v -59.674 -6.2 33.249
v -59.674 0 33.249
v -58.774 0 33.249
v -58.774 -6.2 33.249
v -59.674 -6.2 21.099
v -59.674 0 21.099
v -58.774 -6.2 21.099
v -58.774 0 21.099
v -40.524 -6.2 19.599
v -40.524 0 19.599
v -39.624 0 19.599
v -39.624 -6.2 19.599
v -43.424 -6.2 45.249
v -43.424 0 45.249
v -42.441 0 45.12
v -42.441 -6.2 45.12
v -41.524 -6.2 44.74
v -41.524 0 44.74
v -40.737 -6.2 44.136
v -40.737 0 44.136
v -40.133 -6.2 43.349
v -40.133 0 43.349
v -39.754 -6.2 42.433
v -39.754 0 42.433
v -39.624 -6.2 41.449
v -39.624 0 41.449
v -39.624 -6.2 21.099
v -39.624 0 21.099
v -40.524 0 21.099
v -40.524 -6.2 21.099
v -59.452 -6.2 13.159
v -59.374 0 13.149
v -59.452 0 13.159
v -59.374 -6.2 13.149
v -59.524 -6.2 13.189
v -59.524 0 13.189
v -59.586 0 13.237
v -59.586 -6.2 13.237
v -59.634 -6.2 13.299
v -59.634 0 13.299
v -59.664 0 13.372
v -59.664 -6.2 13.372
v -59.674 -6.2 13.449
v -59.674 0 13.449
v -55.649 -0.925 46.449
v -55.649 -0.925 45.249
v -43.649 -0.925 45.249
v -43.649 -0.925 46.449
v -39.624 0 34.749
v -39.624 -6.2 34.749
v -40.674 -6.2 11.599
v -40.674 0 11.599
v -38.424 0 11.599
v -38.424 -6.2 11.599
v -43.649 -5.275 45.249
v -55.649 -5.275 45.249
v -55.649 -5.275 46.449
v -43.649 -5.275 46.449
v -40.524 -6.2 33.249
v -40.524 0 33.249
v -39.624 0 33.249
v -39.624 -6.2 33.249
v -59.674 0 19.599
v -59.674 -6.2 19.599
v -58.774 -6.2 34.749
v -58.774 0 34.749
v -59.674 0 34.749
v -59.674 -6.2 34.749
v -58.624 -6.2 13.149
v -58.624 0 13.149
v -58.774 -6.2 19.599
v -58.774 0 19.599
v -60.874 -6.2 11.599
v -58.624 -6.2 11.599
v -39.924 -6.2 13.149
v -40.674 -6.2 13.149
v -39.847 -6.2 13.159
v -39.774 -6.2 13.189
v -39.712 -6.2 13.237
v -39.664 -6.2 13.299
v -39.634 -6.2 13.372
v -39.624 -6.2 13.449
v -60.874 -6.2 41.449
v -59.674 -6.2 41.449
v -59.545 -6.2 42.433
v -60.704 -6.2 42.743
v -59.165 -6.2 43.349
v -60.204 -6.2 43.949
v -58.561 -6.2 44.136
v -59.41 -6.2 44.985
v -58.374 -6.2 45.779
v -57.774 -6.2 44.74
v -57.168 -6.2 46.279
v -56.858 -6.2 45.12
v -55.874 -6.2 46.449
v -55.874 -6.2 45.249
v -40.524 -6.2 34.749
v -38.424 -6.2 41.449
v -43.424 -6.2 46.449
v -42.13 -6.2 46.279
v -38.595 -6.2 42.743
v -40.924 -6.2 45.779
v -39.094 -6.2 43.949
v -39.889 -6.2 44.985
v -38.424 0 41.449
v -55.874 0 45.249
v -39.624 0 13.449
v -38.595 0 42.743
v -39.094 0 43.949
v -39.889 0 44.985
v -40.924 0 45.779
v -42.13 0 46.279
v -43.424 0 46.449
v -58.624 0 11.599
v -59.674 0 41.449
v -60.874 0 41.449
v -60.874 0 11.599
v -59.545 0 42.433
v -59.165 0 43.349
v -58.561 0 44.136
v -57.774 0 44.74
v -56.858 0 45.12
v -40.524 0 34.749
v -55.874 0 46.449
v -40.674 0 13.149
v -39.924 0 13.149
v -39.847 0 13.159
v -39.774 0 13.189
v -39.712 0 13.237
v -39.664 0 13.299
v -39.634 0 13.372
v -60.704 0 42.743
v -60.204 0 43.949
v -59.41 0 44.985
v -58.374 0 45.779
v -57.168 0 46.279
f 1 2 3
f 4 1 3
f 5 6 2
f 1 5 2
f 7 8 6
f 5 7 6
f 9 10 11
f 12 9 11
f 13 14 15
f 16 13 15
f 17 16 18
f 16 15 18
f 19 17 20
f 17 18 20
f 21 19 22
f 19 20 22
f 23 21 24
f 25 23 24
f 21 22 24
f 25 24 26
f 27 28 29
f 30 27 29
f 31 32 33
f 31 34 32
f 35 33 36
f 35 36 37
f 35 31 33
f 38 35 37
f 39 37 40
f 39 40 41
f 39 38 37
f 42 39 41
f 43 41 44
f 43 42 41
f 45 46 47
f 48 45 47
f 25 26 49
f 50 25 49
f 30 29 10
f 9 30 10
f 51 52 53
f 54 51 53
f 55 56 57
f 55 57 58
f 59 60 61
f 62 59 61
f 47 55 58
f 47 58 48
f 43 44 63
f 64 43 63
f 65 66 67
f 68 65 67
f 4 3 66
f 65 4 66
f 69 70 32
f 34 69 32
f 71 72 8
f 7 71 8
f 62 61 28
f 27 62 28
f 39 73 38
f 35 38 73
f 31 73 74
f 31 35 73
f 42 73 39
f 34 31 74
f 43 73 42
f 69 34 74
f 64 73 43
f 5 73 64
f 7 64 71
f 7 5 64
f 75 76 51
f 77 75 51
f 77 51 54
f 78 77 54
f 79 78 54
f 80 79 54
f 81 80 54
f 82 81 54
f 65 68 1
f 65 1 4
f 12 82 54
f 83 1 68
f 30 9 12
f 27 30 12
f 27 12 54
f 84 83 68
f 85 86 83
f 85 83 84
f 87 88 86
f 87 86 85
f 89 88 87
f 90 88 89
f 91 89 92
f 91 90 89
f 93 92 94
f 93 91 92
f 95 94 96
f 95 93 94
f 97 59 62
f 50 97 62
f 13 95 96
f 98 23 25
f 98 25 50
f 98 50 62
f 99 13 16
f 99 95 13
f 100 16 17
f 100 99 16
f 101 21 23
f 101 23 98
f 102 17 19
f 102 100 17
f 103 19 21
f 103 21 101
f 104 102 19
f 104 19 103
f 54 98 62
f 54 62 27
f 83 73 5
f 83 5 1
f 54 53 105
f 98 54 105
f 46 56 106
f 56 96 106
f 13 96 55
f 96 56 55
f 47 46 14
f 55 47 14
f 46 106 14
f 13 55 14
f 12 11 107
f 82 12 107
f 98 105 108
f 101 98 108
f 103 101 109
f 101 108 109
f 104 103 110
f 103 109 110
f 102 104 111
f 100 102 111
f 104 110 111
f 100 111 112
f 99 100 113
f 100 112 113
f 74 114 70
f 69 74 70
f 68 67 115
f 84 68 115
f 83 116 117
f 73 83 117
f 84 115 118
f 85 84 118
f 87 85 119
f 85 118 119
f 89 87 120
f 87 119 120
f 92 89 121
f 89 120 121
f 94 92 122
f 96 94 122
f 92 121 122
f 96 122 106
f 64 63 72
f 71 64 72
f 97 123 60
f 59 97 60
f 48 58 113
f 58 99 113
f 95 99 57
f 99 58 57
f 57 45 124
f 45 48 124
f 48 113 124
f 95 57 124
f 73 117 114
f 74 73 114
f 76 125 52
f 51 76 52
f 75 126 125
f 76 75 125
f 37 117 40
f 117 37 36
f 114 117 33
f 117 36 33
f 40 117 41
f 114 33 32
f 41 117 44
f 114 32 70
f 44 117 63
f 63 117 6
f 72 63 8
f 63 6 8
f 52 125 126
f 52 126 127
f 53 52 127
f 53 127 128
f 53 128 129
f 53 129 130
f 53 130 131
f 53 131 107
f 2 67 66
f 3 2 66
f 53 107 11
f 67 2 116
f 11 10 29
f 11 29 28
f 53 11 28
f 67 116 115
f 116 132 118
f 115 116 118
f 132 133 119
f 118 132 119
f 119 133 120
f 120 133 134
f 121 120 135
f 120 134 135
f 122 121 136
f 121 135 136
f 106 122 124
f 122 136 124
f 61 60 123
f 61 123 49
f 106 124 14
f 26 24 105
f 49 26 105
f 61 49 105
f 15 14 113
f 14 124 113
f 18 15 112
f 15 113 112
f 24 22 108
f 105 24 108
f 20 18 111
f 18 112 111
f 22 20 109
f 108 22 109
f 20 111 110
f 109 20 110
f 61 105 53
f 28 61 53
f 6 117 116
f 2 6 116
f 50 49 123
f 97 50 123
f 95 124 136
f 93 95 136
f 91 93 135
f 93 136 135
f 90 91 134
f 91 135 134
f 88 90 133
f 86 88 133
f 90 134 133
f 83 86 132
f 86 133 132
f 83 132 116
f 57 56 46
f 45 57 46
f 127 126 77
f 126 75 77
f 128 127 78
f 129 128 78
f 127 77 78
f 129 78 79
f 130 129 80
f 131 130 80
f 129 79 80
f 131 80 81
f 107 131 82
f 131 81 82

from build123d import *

# Parameters (mm, degrees)
F1_DEPTH     = 9.79181
F2_T         = -2.5
F3_R         = 5
F4_T1_DEPTH  = 80
F4_T3_DEPTH  = 40
F4_T6_ANGLE  = 90
F4_T8_ANGLE  = 90
F4_T10_ANGLE = 90
F4_T12_ANGLE = 90
F5_R         = 7
F6_R         = 4.5
F7_DEPTH     = 130
F8_T         = -2.5
F12_DEPTH    = 6.2
F13_R        = 0.3
F14_R        = 0.3
F15_W        = 12
F15_H        = 4.35
F16_DEPTH    = 67.90149


# Not quite as in the source:
# - a fillet or chamfer that OpenCascade refuses, or shapes differently, is made with other operations: its cross-section is extruded or revolved along the edge and cut away or added


with BuildPart() as f1:
    # F0 (on Front) → F1 (new body)
    with BuildSketch(Plane.XZ):
        with BuildLine():
            Line((33.4467580169, 25.7645070341), (-46.5532419831, 25.7645070341))
            ThreePointArc((-46.5532419831, 25.7645070341), (-50.088775889, 24.30004094), (-51.5532419831, 20.7645070341))
            Line((-51.5532419831, 20.7645070341), (-51.5532419831, -19.2354929659))
            ThreePointArc((-51.5532419831, -19.2354929659), (-50.088775889, -22.7710268718), (-46.5532419831, -24.2354929659))
            Line((-46.5532419831, -24.2354929659), (33.4467580169, -24.2354929659))
            ThreePointArc((33.4467580169, -24.2354929659), (36.9822919229, -22.7710268718), (38.4467580169, -19.2354929659))
            Line((38.4467580169, -19.2354929659), (38.4467580169, 20.7645070341))
            ThreePointArc((38.4467580169, 20.7645070341), (36.9822919229, 24.30004094), (33.4467580169, 25.7645070341))
        make_face()
    extrude(amount=F1_DEPTH)

    # F2
    f2_openings = [f1.faces().sort_by_distance(p)[0] for p in [
        (-6.553242, -9.79181, 0.764507),
    ]]
    offset(amount=F2_T, openings=f2_openings)

    # F3
    f3_edges = [f1.edges().sort_by_distance(p)[0] for p in [
        (-6.553242, -2.5, 23.264507),
    ]]
    fillet(f3_edges, radius=F3_R)

    # F4: fillet of radius 5 on 1 edges, made by hand

    # F4_s2 → F4_t1 (cut)
    with BuildSketch(Plane.YZ.offset(-46.5532419831)):
        with BuildLine():
            ThreePointArc((-6.145905, 23.0776584685), (-8.7774388713, 24.8717434082), (-9.79181, 27.890809903))
            Line((-9.79181, 27.890809903), (-10.29181, 27.890809903))
            Line((-10.29181, 27.890809903), (-10.29181, 23.2645070341))
            Line((-10.29181, 23.2645070341), (-9.79181, 22.7645070341))
            ThreePointArc((-9.79181, 22.7645070341), (-7.5, 22.7645070341), (-6.2813145, 22.5963433251))
            Line((-6.2813145, 22.5963433251), (-6.145905, 23.0776584685))
        make_face()
        with BuildLine():
            ThreePointArc((-9.79181, -26.3617958348), (-8.7774388713, -23.34272934), (-6.145905, -21.5486444004))
            Line((-6.145905, -21.5486444004), (-6.2813145, -21.0673292569))
            ThreePointArc((-6.2813145, -21.0673292569), (-7.5, -21.2354929659), (-9.79181, -21.2354929659))
            Line((-9.79181, -21.2354929659), (-10.29181, -21.7354929659))
            Line((-10.29181, -21.7354929659), (-10.29181, -26.3617958348))
            Line((-10.29181, -26.3617958348), (-9.79181, -26.3617958348))
        make_face()
    extrude(amount=F4_T1_DEPTH, mode=Mode.SUBTRACT)

    # F4_s4 → F4_t3 (cut)
    with BuildSketch(Plane.XY.offset(-19.2354929659)):
        with BuildLine():
            ThreePointArc((-53.679544852, -9.79181), (-50.6604783572, -8.7774388713), (-48.8663934175, -6.145905))
            Line((-48.8663934175, -6.145905), (-48.3850782741, -6.2813145))
            ThreePointArc((-48.3850782741, -6.2813145), (-48.5532419831, -7.5), (-48.5532419831, -9.79181))
            Line((-48.5532419831, -9.79181), (-49.0532419831, -10.29181))
            Line((-49.0532419831, -10.29181), (-53.679544852, -10.29181))
            Line((-53.679544852, -10.29181), (-53.679544852, -9.79181))
        make_face()
        with BuildLine():
            ThreePointArc((40.5730608858, -9.79181), (37.5539943911, -8.7774388713), (35.7599094514, -6.145905))
            Line((35.7599094514, -6.145905), (35.278594308, -6.2813145))
            ThreePointArc((35.278594308, -6.2813145), (35.4467580169, -7.5), (35.4467580169, -9.79181))
            Line((35.4467580169, -9.79181), (35.9467580169, -10.29181))
            Line((35.9467580169, -10.29181), (40.5730608858, -10.29181))
            Line((40.5730608858, -10.29181), (40.5730608858, -9.79181))
        make_face()
    extrude(amount=F4_T3_DEPTH, mode=Mode.SUBTRACT)

    # F4_s5 → F4_t6 (revolve, cut)
    with BuildSketch(Plane.XY.offset(20.7645070341)):
        with BuildLine():
            ThreePointArc((35.9467580169, -4.79181), (37.411224111, -8.3273439059), (40.9467580169, -9.79181))
            Line((40.9467580169, -9.79181), (40.9467580169, -9.89181))
            Line((40.9467580169, -9.89181), (35.8467580169, -9.89181))
            Line((35.8467580169, -9.89181), (35.8467580169, -4.79181))
            Line((35.8467580169, -4.79181), (35.9467580169, -4.79181))
        make_face()
    revolve(axis=Axis((33.4467580169, -9.79181, 20.7645070341), (0, -1, 0)), revolution_arc=F4_T6_ANGLE, mode=Mode.SUBTRACT)

    # F4_s7 → F4_t8 (revolve, cut)
    with BuildSketch(Plane.YZ.offset(-46.5532419831)):
        with BuildLine():
            ThreePointArc((-9.79181, 28.2645070341), (-8.3273439059, 24.7289731282), (-4.79181, 23.2645070341))
            Line((-4.79181, 23.2645070341), (-4.79181, 23.1645070341))
            Line((-4.79181, 23.1645070341), (-9.89181, 23.1645070341))
            Line((-9.89181, 23.1645070341), (-9.89181, 28.2645070341))
            Line((-9.89181, 28.2645070341), (-9.79181, 28.2645070341))
        make_face()
    revolve(axis=Axis((-46.5532419831, -9.79181, 20.7645070341), (0, -1, 0)), revolution_arc=F4_T8_ANGLE, mode=Mode.SUBTRACT)

    # F4_s9 → F4_t10 (revolve, cut)
    with BuildSketch(Plane.XY.offset(-19.2354929659)):
        with BuildLine():
            ThreePointArc((-54.0532419831, -9.79181), (-50.5177080771, -8.3273439059), (-49.0532419831, -4.79181))
            Line((-49.0532419831, -4.79181), (-48.9532419831, -4.79181))
            Line((-48.9532419831, -4.79181), (-48.9532419831, -9.89181))
            Line((-48.9532419831, -9.89181), (-54.0532419831, -9.89181))
            Line((-54.0532419831, -9.89181), (-54.0532419831, -9.79181))
        make_face()
    revolve(axis=Axis((-46.5532419831, -9.79181, -19.2354929659), (0, -1, 0)), revolution_arc=F4_T10_ANGLE, mode=Mode.SUBTRACT)

    # F4_s11 → F4_t12 (revolve, cut)
    with BuildSketch(Plane.YZ.offset(33.4467580169)):
        with BuildLine():
            ThreePointArc((-9.79181, -26.7354929659), (-8.3273439059, -23.19995906), (-4.79181, -21.7354929659))
            Line((-4.79181, -21.7354929659), (-4.79181, -21.6354929659))
            Line((-4.79181, -21.6354929659), (-9.89181, -21.6354929659))
            Line((-9.89181, -21.6354929659), (-9.89181, -26.7354929659))
            Line((-9.89181, -26.7354929659), (-9.79181, -26.7354929659))
        make_face()
    revolve(axis=Axis((33.4467580169, -9.79181, -19.2354929659), (0, -1, 0)), revolution_arc=F4_T12_ANGLE, mode=Mode.SUBTRACT)

    # F5
    f5_edges = [f1.edges().sort_by_distance(p)[0] for p in [
        (-6.553242, 0, 25.764507),
    ]]
    fillet(f5_edges, radius=F5_R)


with BuildPart() as f7:
    # F6 (on Front) → F7 (new body)
    with BuildSketch(Plane.XZ):
        with Locations((-6.3970589777, 0)):
            Circle(F6_R)
    extrude(amount=-F7_DEPTH)

    # F8
    f8_openings = [f7.faces().sort_by_distance(p)[0] for p in [
        (-6.397059, 130, 0),
    ]]
    offset(amount=F8_T, openings=f8_openings)


with BuildPart() as f12:
    # F11 (on Front) → F12 (new body)
    with BuildSketch(Plane.XZ):
        with BuildLine():
            Line((-43.4241547674, 46.4492497861), (-55.8741547674, 46.4492497861))
            ThreePointArc((-55.8741547674, 46.4492497861), (-59.4096886733, 44.9847836921), (-60.8741547674, 41.4492497861))
            Line((-60.8741547674, 41.4492497861), (-60.8741547674, 11.5992497861))
            Line((-60.8741547674, 11.5992497861), (-58.6241547674, 11.5992497861))
            Line((-58.6241547674, 11.5992497861), (-58.6241547674, 13.1492497861))
            Line((-58.6241547674, 13.1492497861), (-59.6741547674, 13.1492497861))
            Line((-59.6741547674, 13.1492497861), (-59.6741547674, 19.5992497861))
            Line((-59.6741547674, 19.5992497861), (-58.7741547674, 19.5992497861))
            Line((-58.7741547674, 19.5992497861), (-58.7741547674, 21.0992497861))
            Line((-58.7741547674, 21.0992497861), (-59.6741547674, 21.0992497861))
            Line((-59.6741547674, 21.0992497861), (-59.6741547674, 33.2492497861))
            Line((-59.6741547674, 33.2492497861), (-58.7741547674, 33.2492497861))
            Line((-58.7741547674, 33.2492497861), (-58.7741547674, 34.7492497861))
            Line((-58.7741547674, 34.7492497861), (-59.6741547674, 34.7492497861))
            Line((-59.6741547674, 34.7492497861), (-59.6741547674, 41.4492497861))
            ThreePointArc((-59.6741547674, 41.4492497861), (-58.5611605359, 44.1362555546), (-55.8741547674, 45.2492497861))
            Line((-55.8741547674, 45.2492497861), (-43.4241547674, 45.2492497861))
            ThreePointArc((-43.4241547674, 45.2492497861), (-40.7371489989, 44.1362555546), (-39.6241547674, 41.4492497861))
            Line((-39.6241547674, 41.4492497861), (-39.6241547674, 34.7492497861))
            Line((-39.6241547674, 34.7492497861), (-40.5241547674, 34.7492497861))
            Line((-40.5241547674, 34.7492497861), (-40.5241547674, 33.2492497861))
            Line((-40.5241547674, 33.2492497861), (-39.6241547674, 33.2492497861))
            Line((-39.6241547674, 33.2492497861), (-39.6241547674, 21.0992497861))
            Line((-39.6241547674, 21.0992497861), (-40.5241547674, 21.0992497861))
            Line((-40.5241547674, 21.0992497861), (-40.5241547674, 19.5992497861))
            Line((-40.5241547674, 19.5992497861), (-39.6241547674, 19.5992497861))
            Line((-39.6241547674, 19.5992497861), (-39.6241547674, 13.1492497861))
            Line((-39.6241547674, 13.1492497861), (-40.6741547674, 13.1492497861))
            Line((-40.6741547674, 13.1492497861), (-40.6741547674, 11.5992497861))
            Line((-40.6741547674, 11.5992497861), (-38.4241547674, 11.5992497861))
            Line((-38.4241547674, 11.5992497861), (-38.4241547674, 41.4492497861))
            ThreePointArc((-38.4241547674, 41.4492497861), (-39.8886208615, 44.9847836921), (-43.4241547674, 46.4492497861))
        make_face()
    extrude(amount=F12_DEPTH)

    # F13
    f13_edges = [f12.edges().sort_by_distance(p)[0] for p in [
        (-59.674155, -3.1, 13.14925),
    ]]
    fillet(f13_edges, radius=F13_R)

    # F14
    f14_edges = [f12.edges().sort_by_distance(p)[0] for p in [
        (-39.624155, -3.1, 13.14925),
    ]]
    fillet(f14_edges, radius=F14_R)

    # F15 (on Top) → F16 (cut)
    with BuildSketch(Plane.XY):
        with Locations((-49.6491547674, -3.1)):
            Rectangle(F15_W, F15_H)
    extrude(amount=F16_DEPTH, mode=Mode.SUBTRACT)


solid = f12.part
